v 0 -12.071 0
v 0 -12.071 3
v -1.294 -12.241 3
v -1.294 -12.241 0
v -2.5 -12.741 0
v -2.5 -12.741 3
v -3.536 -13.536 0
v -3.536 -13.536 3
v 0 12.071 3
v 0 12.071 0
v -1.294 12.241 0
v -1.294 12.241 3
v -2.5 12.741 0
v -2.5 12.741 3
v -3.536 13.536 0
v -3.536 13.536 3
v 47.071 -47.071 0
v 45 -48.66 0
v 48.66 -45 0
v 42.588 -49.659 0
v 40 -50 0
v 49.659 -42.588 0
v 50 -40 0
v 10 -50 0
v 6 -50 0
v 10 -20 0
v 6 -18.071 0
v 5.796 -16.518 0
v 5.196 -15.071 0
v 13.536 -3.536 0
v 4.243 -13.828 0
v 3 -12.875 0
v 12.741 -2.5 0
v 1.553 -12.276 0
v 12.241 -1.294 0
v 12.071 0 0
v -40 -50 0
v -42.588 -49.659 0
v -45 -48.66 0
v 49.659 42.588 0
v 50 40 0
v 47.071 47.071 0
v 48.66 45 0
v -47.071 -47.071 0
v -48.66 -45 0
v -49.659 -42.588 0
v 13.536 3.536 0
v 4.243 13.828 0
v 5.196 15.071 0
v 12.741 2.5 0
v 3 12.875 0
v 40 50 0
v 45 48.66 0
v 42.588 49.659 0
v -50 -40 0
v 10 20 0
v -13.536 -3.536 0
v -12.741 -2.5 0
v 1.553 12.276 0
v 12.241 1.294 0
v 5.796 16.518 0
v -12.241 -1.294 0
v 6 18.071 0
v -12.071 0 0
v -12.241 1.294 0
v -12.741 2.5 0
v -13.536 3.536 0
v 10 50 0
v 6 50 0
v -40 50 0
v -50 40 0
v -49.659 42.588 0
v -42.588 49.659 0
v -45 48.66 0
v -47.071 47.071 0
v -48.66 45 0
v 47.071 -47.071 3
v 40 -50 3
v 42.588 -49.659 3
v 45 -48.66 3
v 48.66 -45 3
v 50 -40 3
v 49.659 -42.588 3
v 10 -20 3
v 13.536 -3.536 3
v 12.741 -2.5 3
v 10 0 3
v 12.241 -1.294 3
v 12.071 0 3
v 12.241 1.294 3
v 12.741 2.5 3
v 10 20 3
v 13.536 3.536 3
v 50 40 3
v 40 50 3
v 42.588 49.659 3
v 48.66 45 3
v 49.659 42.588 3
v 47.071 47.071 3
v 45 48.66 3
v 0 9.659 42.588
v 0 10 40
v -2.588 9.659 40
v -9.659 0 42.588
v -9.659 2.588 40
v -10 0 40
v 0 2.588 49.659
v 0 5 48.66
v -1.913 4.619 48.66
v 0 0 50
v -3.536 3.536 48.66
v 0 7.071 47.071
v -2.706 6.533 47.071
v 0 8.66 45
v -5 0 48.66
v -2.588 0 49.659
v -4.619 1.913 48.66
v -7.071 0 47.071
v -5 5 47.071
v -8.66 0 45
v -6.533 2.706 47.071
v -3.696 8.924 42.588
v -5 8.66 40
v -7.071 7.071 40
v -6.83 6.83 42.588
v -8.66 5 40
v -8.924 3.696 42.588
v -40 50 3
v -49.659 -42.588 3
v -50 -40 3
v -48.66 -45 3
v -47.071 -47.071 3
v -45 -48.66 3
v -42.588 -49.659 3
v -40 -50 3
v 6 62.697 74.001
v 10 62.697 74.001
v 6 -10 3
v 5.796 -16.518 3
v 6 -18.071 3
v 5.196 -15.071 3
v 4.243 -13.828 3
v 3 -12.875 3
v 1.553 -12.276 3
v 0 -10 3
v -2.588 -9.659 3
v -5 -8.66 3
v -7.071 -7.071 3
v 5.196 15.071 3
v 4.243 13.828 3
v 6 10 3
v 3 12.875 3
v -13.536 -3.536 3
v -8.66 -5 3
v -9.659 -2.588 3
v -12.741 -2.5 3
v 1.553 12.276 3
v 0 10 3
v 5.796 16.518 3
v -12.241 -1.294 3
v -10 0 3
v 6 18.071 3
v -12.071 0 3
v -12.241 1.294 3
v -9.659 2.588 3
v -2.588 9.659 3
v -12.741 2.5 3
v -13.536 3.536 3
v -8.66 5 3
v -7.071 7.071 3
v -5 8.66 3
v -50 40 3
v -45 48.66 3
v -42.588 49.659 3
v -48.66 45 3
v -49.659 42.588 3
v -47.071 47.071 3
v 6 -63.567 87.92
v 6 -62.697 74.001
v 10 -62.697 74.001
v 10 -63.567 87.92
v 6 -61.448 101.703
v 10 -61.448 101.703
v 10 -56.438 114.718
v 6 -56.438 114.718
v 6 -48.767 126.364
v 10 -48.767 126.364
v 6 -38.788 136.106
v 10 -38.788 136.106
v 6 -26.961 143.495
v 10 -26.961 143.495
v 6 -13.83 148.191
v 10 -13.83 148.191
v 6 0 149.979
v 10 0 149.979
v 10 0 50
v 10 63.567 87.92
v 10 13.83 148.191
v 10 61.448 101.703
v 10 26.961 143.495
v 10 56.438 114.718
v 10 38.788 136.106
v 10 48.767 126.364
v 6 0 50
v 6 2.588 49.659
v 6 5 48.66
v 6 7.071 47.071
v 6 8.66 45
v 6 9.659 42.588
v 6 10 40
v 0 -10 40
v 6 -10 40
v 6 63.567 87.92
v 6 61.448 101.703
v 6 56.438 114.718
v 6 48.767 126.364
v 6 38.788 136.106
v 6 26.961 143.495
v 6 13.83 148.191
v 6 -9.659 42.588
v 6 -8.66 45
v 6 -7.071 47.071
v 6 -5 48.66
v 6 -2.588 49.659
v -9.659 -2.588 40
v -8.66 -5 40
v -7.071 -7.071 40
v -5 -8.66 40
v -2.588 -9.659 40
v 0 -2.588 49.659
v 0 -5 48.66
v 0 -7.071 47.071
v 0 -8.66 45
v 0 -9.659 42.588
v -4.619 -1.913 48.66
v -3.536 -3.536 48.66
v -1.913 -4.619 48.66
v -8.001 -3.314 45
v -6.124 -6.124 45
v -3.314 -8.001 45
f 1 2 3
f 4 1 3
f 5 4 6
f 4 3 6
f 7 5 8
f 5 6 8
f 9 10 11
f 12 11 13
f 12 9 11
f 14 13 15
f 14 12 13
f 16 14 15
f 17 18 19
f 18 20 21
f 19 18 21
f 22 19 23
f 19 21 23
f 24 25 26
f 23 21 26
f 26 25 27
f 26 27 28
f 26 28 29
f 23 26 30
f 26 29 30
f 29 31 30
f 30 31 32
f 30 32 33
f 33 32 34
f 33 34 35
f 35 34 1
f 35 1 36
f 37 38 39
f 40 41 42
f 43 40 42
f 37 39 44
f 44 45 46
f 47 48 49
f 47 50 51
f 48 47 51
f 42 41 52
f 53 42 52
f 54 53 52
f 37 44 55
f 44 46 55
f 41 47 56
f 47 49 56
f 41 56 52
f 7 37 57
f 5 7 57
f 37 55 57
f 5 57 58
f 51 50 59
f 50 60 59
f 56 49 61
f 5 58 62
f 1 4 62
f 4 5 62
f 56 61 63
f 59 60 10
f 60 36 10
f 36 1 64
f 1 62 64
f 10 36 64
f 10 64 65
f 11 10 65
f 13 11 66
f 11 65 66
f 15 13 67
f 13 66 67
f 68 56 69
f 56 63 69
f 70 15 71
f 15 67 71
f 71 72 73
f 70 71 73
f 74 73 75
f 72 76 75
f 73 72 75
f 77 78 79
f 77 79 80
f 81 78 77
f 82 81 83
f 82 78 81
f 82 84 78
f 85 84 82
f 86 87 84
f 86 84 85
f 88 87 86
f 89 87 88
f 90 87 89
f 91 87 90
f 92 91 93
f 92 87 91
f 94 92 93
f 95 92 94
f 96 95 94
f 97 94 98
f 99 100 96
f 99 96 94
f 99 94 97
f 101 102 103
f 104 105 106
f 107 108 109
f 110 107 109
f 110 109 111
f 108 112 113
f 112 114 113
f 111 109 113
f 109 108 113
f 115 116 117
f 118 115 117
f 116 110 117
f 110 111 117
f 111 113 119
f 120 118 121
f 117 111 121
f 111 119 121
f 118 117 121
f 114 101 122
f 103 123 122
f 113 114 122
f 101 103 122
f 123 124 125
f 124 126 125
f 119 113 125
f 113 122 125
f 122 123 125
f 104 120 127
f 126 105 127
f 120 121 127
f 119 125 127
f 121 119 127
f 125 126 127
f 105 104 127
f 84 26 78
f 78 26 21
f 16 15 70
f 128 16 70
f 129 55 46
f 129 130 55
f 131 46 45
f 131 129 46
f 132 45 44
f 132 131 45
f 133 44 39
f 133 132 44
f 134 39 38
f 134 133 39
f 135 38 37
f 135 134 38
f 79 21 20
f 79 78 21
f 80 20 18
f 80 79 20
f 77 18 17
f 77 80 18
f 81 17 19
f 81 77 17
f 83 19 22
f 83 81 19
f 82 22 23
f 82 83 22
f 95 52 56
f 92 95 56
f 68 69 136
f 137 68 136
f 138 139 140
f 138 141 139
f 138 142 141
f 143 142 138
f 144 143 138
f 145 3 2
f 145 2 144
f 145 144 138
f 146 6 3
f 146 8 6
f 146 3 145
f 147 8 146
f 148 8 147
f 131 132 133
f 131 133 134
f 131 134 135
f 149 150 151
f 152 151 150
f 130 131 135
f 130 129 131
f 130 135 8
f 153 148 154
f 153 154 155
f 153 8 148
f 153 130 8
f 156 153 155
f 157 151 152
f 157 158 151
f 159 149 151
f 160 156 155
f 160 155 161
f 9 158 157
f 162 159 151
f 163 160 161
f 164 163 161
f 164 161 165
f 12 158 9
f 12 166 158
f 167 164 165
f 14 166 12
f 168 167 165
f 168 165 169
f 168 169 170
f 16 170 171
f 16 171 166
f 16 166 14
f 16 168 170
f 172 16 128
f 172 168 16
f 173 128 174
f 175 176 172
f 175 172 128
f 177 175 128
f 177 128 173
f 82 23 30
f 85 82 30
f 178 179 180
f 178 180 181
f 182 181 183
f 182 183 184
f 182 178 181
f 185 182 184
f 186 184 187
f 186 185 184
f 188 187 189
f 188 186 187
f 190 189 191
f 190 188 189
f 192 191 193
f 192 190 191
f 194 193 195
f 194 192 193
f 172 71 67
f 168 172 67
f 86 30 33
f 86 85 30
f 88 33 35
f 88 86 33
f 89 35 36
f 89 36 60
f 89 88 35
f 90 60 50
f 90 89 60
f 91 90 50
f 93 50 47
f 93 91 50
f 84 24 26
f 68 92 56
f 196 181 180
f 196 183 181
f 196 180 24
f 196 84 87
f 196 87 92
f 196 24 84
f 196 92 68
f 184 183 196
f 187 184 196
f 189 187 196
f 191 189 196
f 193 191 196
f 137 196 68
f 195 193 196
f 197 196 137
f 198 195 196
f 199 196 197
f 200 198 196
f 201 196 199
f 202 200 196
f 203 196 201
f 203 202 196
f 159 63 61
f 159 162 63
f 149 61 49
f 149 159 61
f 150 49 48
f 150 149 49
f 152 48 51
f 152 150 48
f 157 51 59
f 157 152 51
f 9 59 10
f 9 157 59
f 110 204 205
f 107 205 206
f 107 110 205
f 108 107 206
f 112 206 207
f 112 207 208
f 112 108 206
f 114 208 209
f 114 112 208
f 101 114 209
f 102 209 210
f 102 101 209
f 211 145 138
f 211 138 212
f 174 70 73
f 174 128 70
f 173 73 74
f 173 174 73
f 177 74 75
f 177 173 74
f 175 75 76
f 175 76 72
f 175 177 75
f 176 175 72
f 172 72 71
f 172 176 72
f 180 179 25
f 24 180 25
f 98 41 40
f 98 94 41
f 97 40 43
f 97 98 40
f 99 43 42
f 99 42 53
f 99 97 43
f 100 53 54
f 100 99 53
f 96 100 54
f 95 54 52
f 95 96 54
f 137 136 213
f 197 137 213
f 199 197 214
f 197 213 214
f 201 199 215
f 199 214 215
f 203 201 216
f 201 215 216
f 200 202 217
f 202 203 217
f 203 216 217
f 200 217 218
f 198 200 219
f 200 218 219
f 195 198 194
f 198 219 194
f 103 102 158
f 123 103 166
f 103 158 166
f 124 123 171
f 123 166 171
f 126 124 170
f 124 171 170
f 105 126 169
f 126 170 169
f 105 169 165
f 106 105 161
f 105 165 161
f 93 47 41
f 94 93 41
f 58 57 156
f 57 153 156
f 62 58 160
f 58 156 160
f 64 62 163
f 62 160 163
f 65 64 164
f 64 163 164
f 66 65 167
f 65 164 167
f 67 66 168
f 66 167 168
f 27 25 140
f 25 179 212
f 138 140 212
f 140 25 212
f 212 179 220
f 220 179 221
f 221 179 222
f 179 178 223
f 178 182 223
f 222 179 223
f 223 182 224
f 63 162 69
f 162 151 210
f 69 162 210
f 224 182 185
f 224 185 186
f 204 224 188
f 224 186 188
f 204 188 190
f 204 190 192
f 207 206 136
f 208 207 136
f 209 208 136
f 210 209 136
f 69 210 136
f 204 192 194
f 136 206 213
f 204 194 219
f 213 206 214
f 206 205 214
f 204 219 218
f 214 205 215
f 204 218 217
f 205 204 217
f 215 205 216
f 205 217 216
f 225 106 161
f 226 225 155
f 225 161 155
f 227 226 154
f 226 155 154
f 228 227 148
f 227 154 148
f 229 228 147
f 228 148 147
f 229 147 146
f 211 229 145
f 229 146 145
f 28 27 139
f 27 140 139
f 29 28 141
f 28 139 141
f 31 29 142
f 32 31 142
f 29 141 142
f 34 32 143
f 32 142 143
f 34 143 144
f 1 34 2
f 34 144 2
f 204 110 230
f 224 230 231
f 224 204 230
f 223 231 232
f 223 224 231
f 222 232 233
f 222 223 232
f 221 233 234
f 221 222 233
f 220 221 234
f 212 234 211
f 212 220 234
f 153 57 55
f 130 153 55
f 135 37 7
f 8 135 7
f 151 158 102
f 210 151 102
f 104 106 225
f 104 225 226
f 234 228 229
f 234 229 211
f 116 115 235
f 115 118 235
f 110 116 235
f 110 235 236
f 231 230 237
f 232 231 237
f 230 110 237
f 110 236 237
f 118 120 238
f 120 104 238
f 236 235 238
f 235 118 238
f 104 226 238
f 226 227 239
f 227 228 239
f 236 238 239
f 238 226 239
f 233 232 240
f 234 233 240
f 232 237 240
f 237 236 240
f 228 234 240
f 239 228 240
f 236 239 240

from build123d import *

# Parameters (mm, degrees)
F1_DEPTH    = 3
F2_R        = 9.99999
F3_R        = 5
F4_DEPTH    = 50
F6_DEPTH    = 10
F7_DEPTH    = 6
F8_T1_DEPTH = 387.2306894548
F9_R        = 9.99999
F10_R       = 5.99999


# Not quite as in the source:
# - a fillet or chamfer that OpenCascade refuses, or shapes differently, is made with other operations: its cross-section is extruded or revolved along the edge and cut away or added
# - a fillet or chamfer is up to 0.001 mm smaller than in the source, because OpenCascade refuses the exact size


with BuildPart() as f1:
    # F0 (on Top) → F1 (new body)
    with BuildSketch(Plane.XY):
        with BuildLine():
            Line((0, 10), (10, 0))
            ThreePointArc((10, 0), (7.0710678119, 7.0710678119), (0, 10))
        make_face()
        with BuildLine():
            Line((50, -40), (10, 0))
            ThreePointArc((10, 0), (7.0710678119, -7.0710678119), (0, -10))
            Line((0, -10), (40, -50))
            Line((40, -50), (50, -50))
            Line((50, -50), (50, -40))
        make_face()
        Polygon((0, -10), (10, 0), (0, 10), (-10, 0), align=None)
        with BuildLine():
            ThreePointArc((0, 10), (7.0710678119, 7.0710678119), (10, 0))
            Line((10, 0), (50, 40))
            Line((50, 40), (50, 50))
            Line((50, 50), (40, 50))
            Line((40, 50), (0, 10))
        make_face()
        with BuildLine():
            ThreePointArc((0, -10), (7.0710678119, -7.0710678119), (10, 0))
            Line((10, 0), (0, -10))
        make_face()
        with BuildLine():
            Line((-10, 0), (0, 10))
            ThreePointArc((0, 10), (-7.0710678119, 7.0710678119), (-10, 0))
        make_face()
        with BuildLine():
            ThreePointArc((-10, 0), (-7.0710678119, 7.0710678119), (0, 10))
            Line((0, 10), (-40, 50))
            Line((-40, 50), (-50, 50))
            Line((-50, 50), (-50, 40))
            Line((-50, 40), (-10, 0))
        make_face()
        with BuildLine():
            Line((-40, -50), (0, -10))
            ThreePointArc((0, -10), (-7.0710678119, -7.0710678119), (-10, 0))
            Line((-10, 0), (-50, -40))
            Line((-50, -40), (-50, -50))
            Line((-50, -50), (-40, -50))
        make_face()
        with BuildLine():
            ThreePointArc((-10, 0), (-7.0710678119, -7.0710678119), (0, -10))
            Line((0, -10), (-10, 0))
        make_face()
    extrude(amount=F1_DEPTH)

    # F2 (radius 10 in the source; OpenCascade refuses exactly that, so slightly less here)
    f2_edges = [f1.edges().sort_by_distance(p)[0] for p in [
        (-50, 50, 1.5),
        (-50, -50, 1.5),
        (50, -50, 1.5),
        (50, 50, 1.5),
    ]]
    fillet(f2_edges, radius=F2_R)

    # F3
    f3_edges = [f1.edges().sort_by_distance(p)[0] for p in [
        (10, 0, 1.5),
        (0, 10, 1.5),
        (-10, 0, 1.5),
        (0, -10, 1.5),
    ]]
    fillet(f3_edges, radius=F3_R)

    # F0 (on Top) → F4 (join)
    with BuildSketch(Plane.XY):
        with BuildLine():
            Line((0, 10), (10, 0))
            ThreePointArc((10, 0), (7.0710678119, 7.0710678119), (0, 10))
        make_face()
        Polygon((0, -10), (10, 0), (0, 10), (-10, 0), align=None)
        with BuildLine():
            ThreePointArc((0, -10), (7.0710678119, -7.0710678119), (10, 0))
            Line((10, 0), (0, -10))
        make_face()
        with BuildLine():
            Line((-10, 0), (0, 10))
            ThreePointArc((0, 10), (-7.0710678119, 7.0710678119), (-10, 0))
        make_face()
        with BuildLine():
            ThreePointArc((-10, 0), (-7.0710678119, -7.0710678119), (0, -10))
            Line((0, -10), (-10, 0))
        make_face()
    extrude(amount=F4_DEPTH)

    # F5 (on Right) → F6 (join)
    with BuildSketch(Plane.YZ):
        with BuildLine():
            Line((-70.7106781187, 120.7106781187), (0, 150))
            ThreePointArc((0, 150), (-37.3285426078, 146.4855717522), (-73.3452003698, 136.0657990677))
            Line((-73.3452003698, 136.0657990677), (-70.7106781187, 120.7106781187))
        make_face()
        Polygon((-64.6446609407, 85.3553390593), (0, 150), (-70.7106781187, 120.7106781187), align=None)
        Polygon((-50, 0), (0, 0), (0, 150), (-64.6446609407, 85.3553390593), align=None)
        Polygon((0, 150), (0, 0), (50, 0), (64.6446609407, 85.3553390593), align=None)
        Polygon((70.7106781187, 120.7106781187), (0, 150), (64.6446609407, 85.3553390593), align=None)
        with BuildLine():
            ThreePointArc((73.3452003698, 136.0657990677), (37.3285426078, 146.4855717522), (0, 150))
            Line((0, 150), (70.7106781187, 120.7106781187))
            Line((70.7106781187, 120.7106781187), (73.3452003698, 136.0657990677))
        make_face()
    extrude(amount=F6_DEPTH)

    # F7 (cut): a face of the model
    f7_faces = [f1.faces().sort_by_distance(p)[0] for p in [
        (0, 0, 80.6875743248),
    ]]
    extrude(f7_faces, amount=-F7_DEPTH, mode=Mode.SUBTRACT)

    # F8: fillet of radius 65 on 2 edges, made by hand

    # F8_s2 → F8_t1 (cut)
    with BuildSketch(Plane.YZ.offset(-185.6153447274)):
        with BuildLine():
            ThreePointArc((-62.6966411117, 74.0014474486), (-48.1162932181, 127.140168964), (2.0255781715, 149.9897423196))
            ThreePointArc((2.0255781715, 149.9897423196), (-36.3330590034, 146.6720845048), (-73.3452003698, 136.0657990677))
            Line((-73.3452003698, 136.0657990677), (-62.6966411117, 74.0014474486))
        make_face()
        with BuildLine():
            ThreePointArc((62.6966411117, 74.0014474486), (48.1162932181, 127.140168964), (-2.0255781715, 149.9897423196))
            ThreePointArc((-2.0255781715, 149.9897423196), (36.3330590034, 146.6720845048), (73.3452003698, 136.0657990677))
            Line((73.3452003698, 136.0657990677), (62.6966411117, 74.0014474486))
        make_face()
    extrude(amount=F8_T1_DEPTH, mode=Mode.SUBTRACT)

    # F9 (radius 10 in the source; OpenCascade refuses exactly that, so slightly less here)
    f9_edges = [f1.edges().sort_by_distance(p)[0] for p in [
        (-10, 0, 50),
        (3, 10, 50),
        (3, -10, 50),
    ]]
    fillet(f9_edges, radius=F9_R)

    # F10 (radius 6 in the source; OpenCascade refuses exactly that, so slightly less here)
    f10_edges = [f1.edges().sort_by_distance(p)[0] for p in [
        (6, 12.071068, 1.5),
        (6, -12.071068, 1.5),
    ]]
    fillet(f10_edges, radius=F10_R)


solid = f1.part
